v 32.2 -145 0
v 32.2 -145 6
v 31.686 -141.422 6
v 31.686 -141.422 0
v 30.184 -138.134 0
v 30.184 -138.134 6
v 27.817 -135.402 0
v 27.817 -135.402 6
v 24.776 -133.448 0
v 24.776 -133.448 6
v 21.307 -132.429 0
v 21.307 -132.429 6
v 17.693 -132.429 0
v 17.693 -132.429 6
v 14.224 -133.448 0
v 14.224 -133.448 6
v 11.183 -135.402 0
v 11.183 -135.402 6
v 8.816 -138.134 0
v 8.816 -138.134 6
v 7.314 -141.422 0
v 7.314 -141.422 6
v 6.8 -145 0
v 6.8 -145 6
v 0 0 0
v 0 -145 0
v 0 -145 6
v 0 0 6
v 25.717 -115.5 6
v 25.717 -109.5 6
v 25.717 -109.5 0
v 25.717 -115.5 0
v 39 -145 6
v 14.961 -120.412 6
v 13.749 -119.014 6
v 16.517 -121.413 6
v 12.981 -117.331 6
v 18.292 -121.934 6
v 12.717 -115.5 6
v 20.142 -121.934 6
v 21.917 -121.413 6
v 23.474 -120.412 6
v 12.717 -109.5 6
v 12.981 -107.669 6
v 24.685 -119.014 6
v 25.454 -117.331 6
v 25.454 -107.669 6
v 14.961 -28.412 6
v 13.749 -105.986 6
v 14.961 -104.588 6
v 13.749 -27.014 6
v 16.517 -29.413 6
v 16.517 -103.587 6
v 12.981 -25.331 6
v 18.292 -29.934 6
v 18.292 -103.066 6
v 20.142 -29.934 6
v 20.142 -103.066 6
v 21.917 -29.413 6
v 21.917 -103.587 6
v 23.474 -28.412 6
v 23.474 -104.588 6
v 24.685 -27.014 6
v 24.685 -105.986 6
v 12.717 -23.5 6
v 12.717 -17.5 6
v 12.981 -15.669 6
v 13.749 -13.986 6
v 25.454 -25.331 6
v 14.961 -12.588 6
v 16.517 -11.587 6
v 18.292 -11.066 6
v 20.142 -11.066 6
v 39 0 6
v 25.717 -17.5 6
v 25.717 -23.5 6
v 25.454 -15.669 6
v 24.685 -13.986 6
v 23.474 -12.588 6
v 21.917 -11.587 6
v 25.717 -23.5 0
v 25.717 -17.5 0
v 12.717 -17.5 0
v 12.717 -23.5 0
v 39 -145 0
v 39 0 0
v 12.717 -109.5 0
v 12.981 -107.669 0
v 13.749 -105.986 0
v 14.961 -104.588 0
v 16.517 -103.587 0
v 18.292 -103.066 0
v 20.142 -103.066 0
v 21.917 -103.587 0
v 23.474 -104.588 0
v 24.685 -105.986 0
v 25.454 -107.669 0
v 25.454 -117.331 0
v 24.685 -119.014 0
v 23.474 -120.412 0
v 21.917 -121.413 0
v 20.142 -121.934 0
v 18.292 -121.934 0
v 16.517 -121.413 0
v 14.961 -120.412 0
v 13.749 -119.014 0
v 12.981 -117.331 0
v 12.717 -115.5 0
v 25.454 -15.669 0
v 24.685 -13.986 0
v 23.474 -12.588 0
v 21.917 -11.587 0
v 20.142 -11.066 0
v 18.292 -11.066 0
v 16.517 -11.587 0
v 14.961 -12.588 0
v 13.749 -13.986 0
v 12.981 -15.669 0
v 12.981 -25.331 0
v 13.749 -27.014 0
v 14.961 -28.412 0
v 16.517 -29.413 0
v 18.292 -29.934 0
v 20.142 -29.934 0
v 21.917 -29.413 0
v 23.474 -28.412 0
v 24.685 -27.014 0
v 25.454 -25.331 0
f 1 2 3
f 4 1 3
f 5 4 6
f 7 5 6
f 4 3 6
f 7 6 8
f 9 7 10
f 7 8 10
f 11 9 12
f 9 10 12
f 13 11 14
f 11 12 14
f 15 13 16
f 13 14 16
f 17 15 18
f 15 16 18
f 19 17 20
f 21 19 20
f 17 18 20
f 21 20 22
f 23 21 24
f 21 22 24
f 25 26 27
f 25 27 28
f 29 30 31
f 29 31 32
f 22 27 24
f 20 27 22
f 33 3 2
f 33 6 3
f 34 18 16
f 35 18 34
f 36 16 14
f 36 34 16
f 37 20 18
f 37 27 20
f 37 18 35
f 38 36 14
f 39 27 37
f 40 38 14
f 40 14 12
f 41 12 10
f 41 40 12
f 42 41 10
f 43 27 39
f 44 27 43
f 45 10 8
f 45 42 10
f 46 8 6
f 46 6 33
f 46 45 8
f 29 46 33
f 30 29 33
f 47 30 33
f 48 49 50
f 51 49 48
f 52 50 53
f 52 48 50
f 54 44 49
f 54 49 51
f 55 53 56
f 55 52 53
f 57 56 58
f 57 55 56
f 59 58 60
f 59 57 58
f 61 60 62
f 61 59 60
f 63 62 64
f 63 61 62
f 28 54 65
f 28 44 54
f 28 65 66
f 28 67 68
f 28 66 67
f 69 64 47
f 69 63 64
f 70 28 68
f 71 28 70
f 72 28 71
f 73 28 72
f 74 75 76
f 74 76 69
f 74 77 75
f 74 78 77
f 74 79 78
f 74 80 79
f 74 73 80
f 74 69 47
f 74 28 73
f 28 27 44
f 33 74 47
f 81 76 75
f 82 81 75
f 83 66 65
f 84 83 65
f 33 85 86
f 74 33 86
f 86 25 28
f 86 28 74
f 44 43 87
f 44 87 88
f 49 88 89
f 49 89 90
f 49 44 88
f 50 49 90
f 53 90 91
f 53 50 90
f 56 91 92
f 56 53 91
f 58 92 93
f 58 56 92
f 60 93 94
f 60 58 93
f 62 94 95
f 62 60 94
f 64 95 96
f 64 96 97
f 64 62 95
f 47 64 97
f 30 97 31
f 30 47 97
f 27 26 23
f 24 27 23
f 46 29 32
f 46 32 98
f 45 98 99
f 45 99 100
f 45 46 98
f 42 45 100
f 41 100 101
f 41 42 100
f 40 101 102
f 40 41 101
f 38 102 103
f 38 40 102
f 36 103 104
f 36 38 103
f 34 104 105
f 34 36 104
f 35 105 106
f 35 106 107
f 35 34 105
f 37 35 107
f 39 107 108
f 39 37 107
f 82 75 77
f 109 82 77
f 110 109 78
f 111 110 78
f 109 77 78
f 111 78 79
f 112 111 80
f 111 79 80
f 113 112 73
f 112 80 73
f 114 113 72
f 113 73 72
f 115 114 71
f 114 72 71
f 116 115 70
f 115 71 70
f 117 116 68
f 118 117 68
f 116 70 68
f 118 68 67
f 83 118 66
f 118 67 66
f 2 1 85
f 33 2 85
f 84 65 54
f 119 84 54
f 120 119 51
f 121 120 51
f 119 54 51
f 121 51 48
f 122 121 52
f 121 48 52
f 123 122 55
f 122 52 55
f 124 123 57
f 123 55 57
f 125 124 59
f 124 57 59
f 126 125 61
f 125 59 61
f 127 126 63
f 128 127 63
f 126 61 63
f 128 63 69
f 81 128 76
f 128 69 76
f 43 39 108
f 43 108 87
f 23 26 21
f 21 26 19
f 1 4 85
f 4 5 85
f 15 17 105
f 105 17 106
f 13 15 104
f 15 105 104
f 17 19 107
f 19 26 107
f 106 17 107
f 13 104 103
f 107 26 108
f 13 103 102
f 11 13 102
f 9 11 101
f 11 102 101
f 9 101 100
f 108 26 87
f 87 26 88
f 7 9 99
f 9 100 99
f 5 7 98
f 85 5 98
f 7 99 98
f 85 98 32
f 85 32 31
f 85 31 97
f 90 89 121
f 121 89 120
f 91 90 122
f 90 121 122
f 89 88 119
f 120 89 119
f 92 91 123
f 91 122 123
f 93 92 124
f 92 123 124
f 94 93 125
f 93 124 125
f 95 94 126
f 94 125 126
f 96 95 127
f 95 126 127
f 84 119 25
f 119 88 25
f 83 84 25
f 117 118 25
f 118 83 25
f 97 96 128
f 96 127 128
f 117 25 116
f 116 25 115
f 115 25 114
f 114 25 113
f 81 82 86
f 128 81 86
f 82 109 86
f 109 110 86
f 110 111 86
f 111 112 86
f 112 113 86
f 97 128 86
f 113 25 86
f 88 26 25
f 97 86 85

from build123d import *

# Parameters (mm, degrees)
SKETCH1_W           = 39
SKETCH1_H           = 145
BOSS_EXTRUDE1_DEPTH = 6
CUT_EXTRUDE2_DEPTH  = 6
CUT_EXTRUDE3_DEPTH  = 10


with BuildPart() as part:
    # Sketch1 → Boss-Extrude1 (new body)
    with BuildSketch(Plane.XY):
        with Locations((19.5, -72.5)):
            Rectangle(SKETCH1_W, SKETCH1_H)
    extrude(amount=BOSS_EXTRUDE1_DEPTH)

    # Sketch4 → Cut-Extrude2 (cut)
    with BuildSketch(Plane.XY.offset(6)):
        with BuildLine():
            Line((25.717260001, -109.5), (25.717260001, -115.5))
            ThreePointArc((25.717260001, -115.5), (19.217260001, -122), (12.717260001, -115.5))
            Line((12.717260001, -115.5), (12.717260001, -109.5))
            ThreePointArc((12.717260001, -109.5), (19.217260001, -103), (25.717260001, -109.5))
        make_face()
        with BuildLine():
            Line((25.717260001, -23.5), (25.717260001, -17.5))
            ThreePointArc((25.717260001, -17.5), (19.217260001, -11), (12.717260001, -17.5))
            Line((12.717260001, -17.5), (12.717260001, -23.5))
            ThreePointArc((12.717260001, -23.5), (19.217260001, -30), (25.717260001, -23.5))
        make_face()
    extrude(amount=-CUT_EXTRUDE2_DEPTH, mode=Mode.SUBTRACT)

    # Sketch5 → Cut-Extrude3 (cut)
    with BuildSketch(Plane.XY.offset(6)):
        with BuildLine():
            Line((6.8, -145), (32.2, -145))
            ThreePointArc((32.2, -145), (19.5, -132.3), (6.8, -145))
        make_face()
    extrude(amount=-CUT_EXTRUDE3_DEPTH, mode=Mode.SUBTRACT)


solid = part.part
